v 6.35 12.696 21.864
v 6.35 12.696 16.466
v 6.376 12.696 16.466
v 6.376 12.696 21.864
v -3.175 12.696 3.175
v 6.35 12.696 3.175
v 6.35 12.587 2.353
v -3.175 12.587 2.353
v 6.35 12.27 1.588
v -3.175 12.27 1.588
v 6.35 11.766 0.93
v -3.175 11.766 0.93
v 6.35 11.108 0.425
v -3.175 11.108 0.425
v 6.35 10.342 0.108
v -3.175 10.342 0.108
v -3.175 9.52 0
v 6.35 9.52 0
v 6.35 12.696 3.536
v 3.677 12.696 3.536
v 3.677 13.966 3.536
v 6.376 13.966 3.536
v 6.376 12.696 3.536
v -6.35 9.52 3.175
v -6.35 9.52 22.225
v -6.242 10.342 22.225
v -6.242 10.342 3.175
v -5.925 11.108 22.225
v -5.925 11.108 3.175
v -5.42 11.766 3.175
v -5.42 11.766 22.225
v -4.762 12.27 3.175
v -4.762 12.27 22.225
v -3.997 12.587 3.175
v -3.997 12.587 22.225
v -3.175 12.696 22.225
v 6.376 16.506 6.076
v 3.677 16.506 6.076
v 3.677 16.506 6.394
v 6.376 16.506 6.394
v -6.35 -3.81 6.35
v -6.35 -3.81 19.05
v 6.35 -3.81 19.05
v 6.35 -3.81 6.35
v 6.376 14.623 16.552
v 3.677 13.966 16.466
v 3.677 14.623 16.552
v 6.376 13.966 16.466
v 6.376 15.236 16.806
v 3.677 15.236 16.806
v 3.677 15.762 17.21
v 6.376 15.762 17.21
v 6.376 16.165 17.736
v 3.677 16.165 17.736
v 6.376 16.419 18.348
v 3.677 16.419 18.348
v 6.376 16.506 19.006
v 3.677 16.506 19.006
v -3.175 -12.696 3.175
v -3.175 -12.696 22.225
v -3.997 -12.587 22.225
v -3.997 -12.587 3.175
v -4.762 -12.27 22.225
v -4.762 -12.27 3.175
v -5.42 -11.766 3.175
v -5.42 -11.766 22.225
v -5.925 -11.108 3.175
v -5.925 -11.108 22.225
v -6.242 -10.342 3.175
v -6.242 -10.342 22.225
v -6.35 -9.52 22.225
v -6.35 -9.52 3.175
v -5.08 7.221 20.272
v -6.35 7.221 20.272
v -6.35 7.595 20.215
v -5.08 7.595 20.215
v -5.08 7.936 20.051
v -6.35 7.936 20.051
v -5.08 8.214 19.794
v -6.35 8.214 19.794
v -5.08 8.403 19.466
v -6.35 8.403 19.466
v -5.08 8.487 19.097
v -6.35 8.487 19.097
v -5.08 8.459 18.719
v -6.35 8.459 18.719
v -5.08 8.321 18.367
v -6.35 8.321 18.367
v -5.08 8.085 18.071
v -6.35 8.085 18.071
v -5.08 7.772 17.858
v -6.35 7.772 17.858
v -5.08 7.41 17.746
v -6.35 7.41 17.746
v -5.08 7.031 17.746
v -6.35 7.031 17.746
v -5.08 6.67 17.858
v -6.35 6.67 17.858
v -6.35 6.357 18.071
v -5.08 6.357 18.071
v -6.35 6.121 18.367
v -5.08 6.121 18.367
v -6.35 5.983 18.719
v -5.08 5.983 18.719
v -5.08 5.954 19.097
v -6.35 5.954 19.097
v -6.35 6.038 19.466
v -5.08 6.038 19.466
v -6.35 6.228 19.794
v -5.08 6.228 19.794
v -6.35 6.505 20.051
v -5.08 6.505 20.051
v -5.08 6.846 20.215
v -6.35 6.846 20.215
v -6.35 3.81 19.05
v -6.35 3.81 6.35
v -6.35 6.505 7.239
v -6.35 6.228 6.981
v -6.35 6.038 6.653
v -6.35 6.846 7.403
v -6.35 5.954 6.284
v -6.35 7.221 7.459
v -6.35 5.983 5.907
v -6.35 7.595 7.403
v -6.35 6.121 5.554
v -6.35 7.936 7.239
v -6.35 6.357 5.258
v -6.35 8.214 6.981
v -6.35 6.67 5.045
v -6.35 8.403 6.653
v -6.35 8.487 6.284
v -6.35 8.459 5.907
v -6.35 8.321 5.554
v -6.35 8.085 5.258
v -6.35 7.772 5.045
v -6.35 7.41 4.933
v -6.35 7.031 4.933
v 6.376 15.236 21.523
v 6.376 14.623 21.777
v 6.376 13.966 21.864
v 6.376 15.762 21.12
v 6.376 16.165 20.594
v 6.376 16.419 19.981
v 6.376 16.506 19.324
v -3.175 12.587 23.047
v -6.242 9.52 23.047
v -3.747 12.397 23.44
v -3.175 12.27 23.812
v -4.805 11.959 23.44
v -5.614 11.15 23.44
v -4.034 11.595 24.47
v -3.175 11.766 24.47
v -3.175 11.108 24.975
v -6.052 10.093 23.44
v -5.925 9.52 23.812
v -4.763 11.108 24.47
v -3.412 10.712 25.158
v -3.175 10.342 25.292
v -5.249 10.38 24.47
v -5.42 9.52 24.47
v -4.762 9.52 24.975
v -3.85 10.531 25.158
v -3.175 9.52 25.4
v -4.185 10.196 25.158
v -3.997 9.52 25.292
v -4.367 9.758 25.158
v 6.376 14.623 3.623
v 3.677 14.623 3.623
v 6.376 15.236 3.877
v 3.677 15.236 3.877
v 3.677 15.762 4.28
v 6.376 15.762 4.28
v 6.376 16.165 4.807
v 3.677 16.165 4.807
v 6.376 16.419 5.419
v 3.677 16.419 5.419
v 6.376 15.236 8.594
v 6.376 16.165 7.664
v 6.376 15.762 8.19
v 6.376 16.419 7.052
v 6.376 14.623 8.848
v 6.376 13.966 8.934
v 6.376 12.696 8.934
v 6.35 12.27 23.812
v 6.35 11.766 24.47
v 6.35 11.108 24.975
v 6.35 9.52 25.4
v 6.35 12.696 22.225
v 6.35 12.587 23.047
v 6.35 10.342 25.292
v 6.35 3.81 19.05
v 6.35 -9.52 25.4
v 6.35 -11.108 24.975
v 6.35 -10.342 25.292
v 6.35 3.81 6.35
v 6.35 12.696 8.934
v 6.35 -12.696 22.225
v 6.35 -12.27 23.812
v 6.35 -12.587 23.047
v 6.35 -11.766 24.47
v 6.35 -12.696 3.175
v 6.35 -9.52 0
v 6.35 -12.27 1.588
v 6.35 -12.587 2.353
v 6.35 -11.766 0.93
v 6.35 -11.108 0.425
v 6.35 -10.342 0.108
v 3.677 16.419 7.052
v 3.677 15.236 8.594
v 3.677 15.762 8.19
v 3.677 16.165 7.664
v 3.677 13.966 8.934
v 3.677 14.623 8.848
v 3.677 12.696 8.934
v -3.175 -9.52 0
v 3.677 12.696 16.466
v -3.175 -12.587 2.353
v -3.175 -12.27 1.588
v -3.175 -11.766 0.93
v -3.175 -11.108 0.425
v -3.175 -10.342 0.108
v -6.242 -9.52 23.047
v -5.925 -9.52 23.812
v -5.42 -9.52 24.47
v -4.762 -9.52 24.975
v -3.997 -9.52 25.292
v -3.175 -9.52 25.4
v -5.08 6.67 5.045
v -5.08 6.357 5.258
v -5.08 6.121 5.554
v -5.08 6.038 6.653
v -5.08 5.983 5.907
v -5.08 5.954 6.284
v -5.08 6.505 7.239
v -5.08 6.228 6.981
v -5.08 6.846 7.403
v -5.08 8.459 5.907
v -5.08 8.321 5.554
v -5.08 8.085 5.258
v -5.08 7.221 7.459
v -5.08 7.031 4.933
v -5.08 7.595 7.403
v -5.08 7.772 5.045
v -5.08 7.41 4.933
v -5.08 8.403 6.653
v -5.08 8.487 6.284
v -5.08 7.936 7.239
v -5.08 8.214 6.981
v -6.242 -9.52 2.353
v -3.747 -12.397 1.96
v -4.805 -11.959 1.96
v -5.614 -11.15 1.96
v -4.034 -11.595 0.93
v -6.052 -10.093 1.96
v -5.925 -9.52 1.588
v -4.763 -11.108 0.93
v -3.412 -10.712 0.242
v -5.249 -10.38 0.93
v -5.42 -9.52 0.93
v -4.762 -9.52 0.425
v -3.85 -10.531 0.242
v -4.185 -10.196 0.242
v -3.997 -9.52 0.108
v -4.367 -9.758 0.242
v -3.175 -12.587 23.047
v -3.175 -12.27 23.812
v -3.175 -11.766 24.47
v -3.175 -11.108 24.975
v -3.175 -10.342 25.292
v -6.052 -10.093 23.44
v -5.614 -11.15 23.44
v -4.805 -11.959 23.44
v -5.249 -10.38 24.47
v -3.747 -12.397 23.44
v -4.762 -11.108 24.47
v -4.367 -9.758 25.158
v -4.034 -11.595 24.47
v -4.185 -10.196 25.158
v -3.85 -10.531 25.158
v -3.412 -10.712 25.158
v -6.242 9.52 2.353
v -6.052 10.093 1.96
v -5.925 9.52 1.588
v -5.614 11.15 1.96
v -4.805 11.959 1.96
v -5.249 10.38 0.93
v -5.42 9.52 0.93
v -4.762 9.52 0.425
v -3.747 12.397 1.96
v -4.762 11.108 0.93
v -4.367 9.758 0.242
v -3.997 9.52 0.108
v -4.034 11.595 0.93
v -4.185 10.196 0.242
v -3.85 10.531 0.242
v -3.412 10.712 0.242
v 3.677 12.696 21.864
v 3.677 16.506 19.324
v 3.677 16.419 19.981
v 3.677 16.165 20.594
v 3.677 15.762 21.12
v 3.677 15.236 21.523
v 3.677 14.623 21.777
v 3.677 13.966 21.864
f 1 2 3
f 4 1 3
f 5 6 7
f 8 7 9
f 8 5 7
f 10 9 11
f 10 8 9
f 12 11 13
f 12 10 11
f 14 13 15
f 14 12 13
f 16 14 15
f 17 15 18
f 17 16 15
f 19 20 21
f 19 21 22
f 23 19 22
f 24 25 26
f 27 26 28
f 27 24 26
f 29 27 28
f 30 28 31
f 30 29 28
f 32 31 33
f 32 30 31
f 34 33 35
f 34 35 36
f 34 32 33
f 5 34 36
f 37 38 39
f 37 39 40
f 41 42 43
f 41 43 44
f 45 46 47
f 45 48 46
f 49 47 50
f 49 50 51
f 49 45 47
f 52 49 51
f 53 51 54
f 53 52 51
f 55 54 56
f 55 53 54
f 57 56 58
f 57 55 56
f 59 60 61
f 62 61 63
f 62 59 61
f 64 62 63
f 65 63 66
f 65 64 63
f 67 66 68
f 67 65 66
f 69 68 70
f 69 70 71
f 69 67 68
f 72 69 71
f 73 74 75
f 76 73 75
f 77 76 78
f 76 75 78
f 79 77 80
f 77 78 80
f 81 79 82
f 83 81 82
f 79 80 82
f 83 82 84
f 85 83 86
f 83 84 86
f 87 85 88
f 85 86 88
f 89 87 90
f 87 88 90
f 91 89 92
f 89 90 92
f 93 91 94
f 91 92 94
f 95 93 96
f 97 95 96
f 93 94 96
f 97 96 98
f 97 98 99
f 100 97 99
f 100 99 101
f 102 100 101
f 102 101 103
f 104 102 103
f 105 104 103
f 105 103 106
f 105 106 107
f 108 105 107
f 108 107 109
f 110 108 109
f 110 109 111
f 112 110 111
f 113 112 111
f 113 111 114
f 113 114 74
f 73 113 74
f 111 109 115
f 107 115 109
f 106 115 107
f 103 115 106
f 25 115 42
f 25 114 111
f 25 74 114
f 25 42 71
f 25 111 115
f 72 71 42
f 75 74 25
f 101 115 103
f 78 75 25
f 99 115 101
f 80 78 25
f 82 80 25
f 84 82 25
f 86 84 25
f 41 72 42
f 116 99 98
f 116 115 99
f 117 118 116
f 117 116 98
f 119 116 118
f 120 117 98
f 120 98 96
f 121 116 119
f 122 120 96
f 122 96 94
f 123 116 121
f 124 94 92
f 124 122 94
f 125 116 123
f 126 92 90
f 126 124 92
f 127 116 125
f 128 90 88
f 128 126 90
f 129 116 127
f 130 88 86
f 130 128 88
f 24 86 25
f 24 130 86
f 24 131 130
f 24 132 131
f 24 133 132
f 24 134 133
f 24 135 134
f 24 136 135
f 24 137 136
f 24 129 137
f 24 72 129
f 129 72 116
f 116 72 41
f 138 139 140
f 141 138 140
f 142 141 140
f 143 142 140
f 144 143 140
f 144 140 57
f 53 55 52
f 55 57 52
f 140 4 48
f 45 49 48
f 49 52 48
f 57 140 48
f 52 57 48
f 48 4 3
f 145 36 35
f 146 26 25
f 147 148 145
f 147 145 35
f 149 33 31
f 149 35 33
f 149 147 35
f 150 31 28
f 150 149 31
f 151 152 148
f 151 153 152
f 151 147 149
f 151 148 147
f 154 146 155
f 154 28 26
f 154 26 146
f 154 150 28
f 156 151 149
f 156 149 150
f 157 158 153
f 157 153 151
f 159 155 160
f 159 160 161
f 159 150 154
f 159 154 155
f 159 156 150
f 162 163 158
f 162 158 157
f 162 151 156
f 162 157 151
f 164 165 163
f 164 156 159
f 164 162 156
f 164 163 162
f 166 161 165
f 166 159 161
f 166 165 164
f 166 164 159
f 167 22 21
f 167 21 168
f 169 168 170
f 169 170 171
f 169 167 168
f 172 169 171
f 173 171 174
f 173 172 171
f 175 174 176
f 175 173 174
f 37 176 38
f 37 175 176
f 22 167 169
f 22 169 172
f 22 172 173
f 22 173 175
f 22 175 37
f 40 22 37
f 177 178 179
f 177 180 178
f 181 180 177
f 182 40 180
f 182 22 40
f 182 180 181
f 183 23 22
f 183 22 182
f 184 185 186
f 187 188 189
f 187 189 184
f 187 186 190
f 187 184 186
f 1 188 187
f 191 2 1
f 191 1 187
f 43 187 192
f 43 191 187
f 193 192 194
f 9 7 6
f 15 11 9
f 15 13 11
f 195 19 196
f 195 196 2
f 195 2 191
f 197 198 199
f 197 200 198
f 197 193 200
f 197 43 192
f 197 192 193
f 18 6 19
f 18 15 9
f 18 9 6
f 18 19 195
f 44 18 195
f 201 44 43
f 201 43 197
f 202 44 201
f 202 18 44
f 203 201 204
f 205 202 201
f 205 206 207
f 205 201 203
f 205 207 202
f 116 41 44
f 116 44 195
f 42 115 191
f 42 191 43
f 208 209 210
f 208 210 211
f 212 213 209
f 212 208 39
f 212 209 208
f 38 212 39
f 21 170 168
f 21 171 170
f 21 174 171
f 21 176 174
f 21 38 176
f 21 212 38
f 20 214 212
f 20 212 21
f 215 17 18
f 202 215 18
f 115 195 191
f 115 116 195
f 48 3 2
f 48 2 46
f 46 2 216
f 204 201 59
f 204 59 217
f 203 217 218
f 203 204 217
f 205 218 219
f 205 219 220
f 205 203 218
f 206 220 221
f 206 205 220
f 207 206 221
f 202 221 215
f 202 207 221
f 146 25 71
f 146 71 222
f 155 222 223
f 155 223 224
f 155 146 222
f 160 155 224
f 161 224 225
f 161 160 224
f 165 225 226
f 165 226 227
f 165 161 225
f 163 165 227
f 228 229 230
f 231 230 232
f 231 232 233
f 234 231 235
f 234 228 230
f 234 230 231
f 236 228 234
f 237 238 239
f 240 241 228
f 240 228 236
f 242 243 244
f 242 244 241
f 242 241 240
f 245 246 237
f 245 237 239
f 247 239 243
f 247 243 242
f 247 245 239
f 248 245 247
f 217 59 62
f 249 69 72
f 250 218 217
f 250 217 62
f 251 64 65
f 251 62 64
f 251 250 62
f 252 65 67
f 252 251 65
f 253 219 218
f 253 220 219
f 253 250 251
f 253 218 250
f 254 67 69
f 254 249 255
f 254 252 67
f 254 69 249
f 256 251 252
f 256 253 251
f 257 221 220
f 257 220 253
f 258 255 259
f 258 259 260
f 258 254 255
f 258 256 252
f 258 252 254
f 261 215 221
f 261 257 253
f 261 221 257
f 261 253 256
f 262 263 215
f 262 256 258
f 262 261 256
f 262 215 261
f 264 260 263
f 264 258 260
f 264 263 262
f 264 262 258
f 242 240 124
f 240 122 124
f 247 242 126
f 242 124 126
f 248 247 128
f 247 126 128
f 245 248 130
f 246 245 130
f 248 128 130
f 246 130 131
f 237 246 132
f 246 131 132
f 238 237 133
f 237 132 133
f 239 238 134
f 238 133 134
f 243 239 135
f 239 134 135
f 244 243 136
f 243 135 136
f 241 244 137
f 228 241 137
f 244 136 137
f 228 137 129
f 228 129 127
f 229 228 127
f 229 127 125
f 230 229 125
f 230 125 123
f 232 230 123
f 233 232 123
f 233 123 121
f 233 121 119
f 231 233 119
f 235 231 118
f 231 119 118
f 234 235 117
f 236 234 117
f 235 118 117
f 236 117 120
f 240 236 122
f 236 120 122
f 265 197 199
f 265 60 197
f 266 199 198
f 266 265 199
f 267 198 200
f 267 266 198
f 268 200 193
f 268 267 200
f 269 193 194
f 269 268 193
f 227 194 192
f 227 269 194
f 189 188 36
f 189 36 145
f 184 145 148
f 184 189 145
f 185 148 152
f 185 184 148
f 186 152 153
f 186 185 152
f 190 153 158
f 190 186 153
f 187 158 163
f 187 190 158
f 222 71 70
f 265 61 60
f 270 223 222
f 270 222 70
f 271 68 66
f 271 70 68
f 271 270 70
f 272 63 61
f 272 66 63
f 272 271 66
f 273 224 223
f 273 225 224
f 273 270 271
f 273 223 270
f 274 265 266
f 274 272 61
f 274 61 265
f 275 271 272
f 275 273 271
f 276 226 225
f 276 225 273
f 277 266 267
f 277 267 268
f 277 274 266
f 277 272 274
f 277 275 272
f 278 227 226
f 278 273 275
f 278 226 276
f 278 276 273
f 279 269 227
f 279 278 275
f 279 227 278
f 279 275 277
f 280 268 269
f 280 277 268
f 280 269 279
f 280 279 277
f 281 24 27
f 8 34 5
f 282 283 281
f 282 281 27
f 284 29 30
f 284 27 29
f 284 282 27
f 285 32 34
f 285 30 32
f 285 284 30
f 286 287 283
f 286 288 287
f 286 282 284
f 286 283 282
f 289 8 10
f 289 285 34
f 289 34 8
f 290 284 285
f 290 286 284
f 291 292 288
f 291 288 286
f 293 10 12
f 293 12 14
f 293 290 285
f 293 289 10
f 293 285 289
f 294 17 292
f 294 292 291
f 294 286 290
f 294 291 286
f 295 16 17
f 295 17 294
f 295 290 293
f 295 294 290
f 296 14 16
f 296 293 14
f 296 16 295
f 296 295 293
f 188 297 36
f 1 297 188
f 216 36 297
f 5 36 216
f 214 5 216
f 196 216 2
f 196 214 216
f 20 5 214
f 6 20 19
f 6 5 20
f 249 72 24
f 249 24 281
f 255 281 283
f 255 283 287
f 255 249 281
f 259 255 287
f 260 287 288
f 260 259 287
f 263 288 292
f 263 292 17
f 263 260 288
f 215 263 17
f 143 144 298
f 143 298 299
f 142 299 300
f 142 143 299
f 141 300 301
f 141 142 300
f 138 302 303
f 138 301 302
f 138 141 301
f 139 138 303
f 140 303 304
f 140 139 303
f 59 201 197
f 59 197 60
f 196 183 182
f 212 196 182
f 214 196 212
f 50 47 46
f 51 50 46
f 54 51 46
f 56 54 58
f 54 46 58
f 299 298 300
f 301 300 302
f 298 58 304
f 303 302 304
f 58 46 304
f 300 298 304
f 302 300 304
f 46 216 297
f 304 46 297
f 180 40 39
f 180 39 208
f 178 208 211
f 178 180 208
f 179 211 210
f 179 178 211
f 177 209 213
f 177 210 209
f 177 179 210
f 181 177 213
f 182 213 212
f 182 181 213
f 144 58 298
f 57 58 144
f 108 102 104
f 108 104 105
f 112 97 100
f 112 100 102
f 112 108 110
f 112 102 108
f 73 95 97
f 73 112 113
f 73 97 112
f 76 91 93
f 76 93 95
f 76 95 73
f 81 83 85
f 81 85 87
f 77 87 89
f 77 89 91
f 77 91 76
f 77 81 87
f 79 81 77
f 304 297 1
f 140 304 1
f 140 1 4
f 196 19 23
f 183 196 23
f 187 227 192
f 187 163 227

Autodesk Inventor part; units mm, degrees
ref_plane "YZ Plane" through (0, 0, 0) normal (1, 0, 0) x (0, 1, 0)
ref_plane "XZ Plane" through (0, 0, 0) normal (0, 1, 0) x (-1, 0, 0)
ref_plane "XY Plane" through (0, 0, 0) normal (0, 0, 1) x (1, 0, 0)
sketch "Sketch1" plane through (0, 0, 0) normal (0, 0, 1) x (1, 0, 0)
  line L0 (6.35, -12.6955) -> (-3.175, -12.6955)
  line L1 (-6.35, -9.5205) -> (-6.35, 9.5205)
  line L2 (-3.175, 12.6955) -> (6.35, 12.6955)
  line L3 (6.35, 12.6955) -> (6.35, -12.6955)
  line L4 (6.35, -12.6955) -> (-6.35, 12.6955) construction
  line L5 (-6.35, -12.6955) -> (6.35, 12.6955) construction
  arc A0 (-3.175, 12.6955) -> (-6.35, 9.5205) centre (-3.175, 9.5205) ccw
  arc A1 (-6.35, -9.5205) -> (-3.175, -12.6955) centre (-3.175, -9.5205) ccw
  point P0 (0, 0)
  dimension "d0" = 12.7
  dimension "d1" = 3.175
extrude "Extrusion1" add sketch "Sketch1" along normal blind 25.4
fillet "Fillet1" radius 3.175 10 edges at (-6.35, 0, 25.4) (-5.4201, -11.7656, 25.4) (1.5875, -12.6955, 25.4) (1.5875, 12.6955, 25.4) (-5.4201, 11.7656, 25.4) (-5.4201, 11.7656, 0) (1.5875, 12.6955, 0) (-5.4201, -11.7656, 0) (1.5875, -12.6955, 0) (-6.35, 0, 0)
sketch "Sketch2" plane through (-3.175, 12.6955, 3.175) normal (0, 1, 0) x (1, 0, 0)
  circle A0 centre (2.6716, -16.206) radius 2.54
  line L0 (0, 0) -> (0, -19.05) projected
  line L1 (9.525, 0) -> (9.525, -19.05) projected
  circle A1 centre (2.6716, -2.844) radius 2.54
  point P0 (3.175, 3.175)
  dimension "d5" = 5.08
extrude "Extrusion2" add sketch "Sketch2" along normal blind 12.7
sketch "Sketch3" plane through (-6.35, -9.5205, 3.175) normal (-1, 0, 0) x (0, 0, 1)
  line L0 (4.445, 6.9805) -> (14.605, 12.0605) construction
  line L1 (14.605, 6.9805) -> (4.445, 12.0605) construction
  line L2 (3.175, 5.7105) -> (3.175, 13.3305)
  line L3 (15.875, 13.3305) -> (15.875, 5.7105)
  line L4 (15.875, 5.0755) -> (3.175, 13.9655) construction
  line L5 (3.175, 5.0755) -> (15.875, 13.9655) construction
  line L6 (3.175, 13.3305) -> (15.875, 13.3305)
  line L7 (15.875, 13.3305) -> (15.875, 5.7105)
  line L8 (15.875, 5.7105) -> (3.175, 5.7105)
  line L9 (3.175, 5.7105) -> (3.175, 13.3305)
  line L10 (3.175, 13.3305) -> (15.875, 5.7105) construction
  line L11 (15.875, 13.3305) -> (3.175, 5.7105) construction
  point P0 (-3.175, 9.5205)
  point P1 (9.525, 9.5205)
  point P2 (15.875, 12.0605)
  point P3 (15.875, 6.9805)
  dimension "d25" = 7.62
extrude "Extrusion3" cut sketch "Sketch3" against normal blind 12.7
sketch "Sketch4" plane through (-0.5034, 25.3955, 19.381) normal (0, 1, 0) x (1, 0, 0)
  line L0 (-9.3616, 22.1264) -> (11.0198, 22.1264)
  line L1 (11.0198, 22.1264) -> (11.0198, -9.2368)
  line L2 (11.0198, -9.2368) -> (-9.3616, -9.2368)
  line L3 (-9.3616, -9.2368) -> (-9.3616, 22.1264)
  point P0 (0.5034, 19.381)
extrude "Extrusion4" cut sketch "Sketch4" against normal blind 12.7
sketch "Sketch5" plane through (-3.175, 12.6955, 3.175) normal (0, 1, 0) x (1, 0, 0)
  line L0 (6.852, -0.3615) -> (9.5509, -0.3615)
  line L1 (9.5509, -0.3615) -> (9.5509, -5.7593)
  line L2 (9.5509, -5.7593) -> (6.852, -5.7593)
  line L3 (6.852, -5.7593) -> (6.852, -0.3615)
  line L4 (6.852, -0.3615) -> (9.5509, -5.7593) construction
  line L5 (9.5509, -0.3615) -> (6.852, -5.7593) construction
  line L6 (0, 0) -> (0, -19.05) projected
  line L7 (9.525, 0) -> (9.525, -19.05) projected
  line L8 (6.852, -18.6885) -> (9.5509, -18.6885)
  line L9 (9.5509, -18.6885) -> (9.5509, -13.2907)
  line L10 (9.5509, -13.2907) -> (6.852, -13.2907)
  line L11 (6.852, -13.2907) -> (6.852, -18.6885)
  line L12 (6.852, -18.6885) -> (9.5509, -13.2907) construction
  line L13 (9.5509, -18.6885) -> (6.852, -13.2907) construction
  point P0 (3.175, 3.175)
  point P1 (8.2015, -3.0604)
  point P2 (8.2015, -15.9896)
extrude "Extrusion5" add sketch "Sketch5" along normal blind 3.81
fillet "Fillet2" radius 2.54 4 edges at (5.0265, 16.5055, 8.9343) (5.0265, 16.5055, 3.5365) (5.0265, 16.5055, 16.4657) (5.0265, 16.5055, 21.8635)
sketch "Sketch7" plane through (-6.35, -9.5205, 3.175) normal (-1, 0, 0) x (0, 0, 1)
  circle A0 centre (3.0142, 16.7412) radius 1.27
  circle A1 centre (15.8269, 16.7412) radius 1.27
  point P0 (-3.175, 9.5205)
  dimension "d26" = 2.54
  dimension "d27" = 2.54
extrude "Extrusion7" cut sketch "Sketch7" against normal blind 1.27
properties part number "pig_face"
